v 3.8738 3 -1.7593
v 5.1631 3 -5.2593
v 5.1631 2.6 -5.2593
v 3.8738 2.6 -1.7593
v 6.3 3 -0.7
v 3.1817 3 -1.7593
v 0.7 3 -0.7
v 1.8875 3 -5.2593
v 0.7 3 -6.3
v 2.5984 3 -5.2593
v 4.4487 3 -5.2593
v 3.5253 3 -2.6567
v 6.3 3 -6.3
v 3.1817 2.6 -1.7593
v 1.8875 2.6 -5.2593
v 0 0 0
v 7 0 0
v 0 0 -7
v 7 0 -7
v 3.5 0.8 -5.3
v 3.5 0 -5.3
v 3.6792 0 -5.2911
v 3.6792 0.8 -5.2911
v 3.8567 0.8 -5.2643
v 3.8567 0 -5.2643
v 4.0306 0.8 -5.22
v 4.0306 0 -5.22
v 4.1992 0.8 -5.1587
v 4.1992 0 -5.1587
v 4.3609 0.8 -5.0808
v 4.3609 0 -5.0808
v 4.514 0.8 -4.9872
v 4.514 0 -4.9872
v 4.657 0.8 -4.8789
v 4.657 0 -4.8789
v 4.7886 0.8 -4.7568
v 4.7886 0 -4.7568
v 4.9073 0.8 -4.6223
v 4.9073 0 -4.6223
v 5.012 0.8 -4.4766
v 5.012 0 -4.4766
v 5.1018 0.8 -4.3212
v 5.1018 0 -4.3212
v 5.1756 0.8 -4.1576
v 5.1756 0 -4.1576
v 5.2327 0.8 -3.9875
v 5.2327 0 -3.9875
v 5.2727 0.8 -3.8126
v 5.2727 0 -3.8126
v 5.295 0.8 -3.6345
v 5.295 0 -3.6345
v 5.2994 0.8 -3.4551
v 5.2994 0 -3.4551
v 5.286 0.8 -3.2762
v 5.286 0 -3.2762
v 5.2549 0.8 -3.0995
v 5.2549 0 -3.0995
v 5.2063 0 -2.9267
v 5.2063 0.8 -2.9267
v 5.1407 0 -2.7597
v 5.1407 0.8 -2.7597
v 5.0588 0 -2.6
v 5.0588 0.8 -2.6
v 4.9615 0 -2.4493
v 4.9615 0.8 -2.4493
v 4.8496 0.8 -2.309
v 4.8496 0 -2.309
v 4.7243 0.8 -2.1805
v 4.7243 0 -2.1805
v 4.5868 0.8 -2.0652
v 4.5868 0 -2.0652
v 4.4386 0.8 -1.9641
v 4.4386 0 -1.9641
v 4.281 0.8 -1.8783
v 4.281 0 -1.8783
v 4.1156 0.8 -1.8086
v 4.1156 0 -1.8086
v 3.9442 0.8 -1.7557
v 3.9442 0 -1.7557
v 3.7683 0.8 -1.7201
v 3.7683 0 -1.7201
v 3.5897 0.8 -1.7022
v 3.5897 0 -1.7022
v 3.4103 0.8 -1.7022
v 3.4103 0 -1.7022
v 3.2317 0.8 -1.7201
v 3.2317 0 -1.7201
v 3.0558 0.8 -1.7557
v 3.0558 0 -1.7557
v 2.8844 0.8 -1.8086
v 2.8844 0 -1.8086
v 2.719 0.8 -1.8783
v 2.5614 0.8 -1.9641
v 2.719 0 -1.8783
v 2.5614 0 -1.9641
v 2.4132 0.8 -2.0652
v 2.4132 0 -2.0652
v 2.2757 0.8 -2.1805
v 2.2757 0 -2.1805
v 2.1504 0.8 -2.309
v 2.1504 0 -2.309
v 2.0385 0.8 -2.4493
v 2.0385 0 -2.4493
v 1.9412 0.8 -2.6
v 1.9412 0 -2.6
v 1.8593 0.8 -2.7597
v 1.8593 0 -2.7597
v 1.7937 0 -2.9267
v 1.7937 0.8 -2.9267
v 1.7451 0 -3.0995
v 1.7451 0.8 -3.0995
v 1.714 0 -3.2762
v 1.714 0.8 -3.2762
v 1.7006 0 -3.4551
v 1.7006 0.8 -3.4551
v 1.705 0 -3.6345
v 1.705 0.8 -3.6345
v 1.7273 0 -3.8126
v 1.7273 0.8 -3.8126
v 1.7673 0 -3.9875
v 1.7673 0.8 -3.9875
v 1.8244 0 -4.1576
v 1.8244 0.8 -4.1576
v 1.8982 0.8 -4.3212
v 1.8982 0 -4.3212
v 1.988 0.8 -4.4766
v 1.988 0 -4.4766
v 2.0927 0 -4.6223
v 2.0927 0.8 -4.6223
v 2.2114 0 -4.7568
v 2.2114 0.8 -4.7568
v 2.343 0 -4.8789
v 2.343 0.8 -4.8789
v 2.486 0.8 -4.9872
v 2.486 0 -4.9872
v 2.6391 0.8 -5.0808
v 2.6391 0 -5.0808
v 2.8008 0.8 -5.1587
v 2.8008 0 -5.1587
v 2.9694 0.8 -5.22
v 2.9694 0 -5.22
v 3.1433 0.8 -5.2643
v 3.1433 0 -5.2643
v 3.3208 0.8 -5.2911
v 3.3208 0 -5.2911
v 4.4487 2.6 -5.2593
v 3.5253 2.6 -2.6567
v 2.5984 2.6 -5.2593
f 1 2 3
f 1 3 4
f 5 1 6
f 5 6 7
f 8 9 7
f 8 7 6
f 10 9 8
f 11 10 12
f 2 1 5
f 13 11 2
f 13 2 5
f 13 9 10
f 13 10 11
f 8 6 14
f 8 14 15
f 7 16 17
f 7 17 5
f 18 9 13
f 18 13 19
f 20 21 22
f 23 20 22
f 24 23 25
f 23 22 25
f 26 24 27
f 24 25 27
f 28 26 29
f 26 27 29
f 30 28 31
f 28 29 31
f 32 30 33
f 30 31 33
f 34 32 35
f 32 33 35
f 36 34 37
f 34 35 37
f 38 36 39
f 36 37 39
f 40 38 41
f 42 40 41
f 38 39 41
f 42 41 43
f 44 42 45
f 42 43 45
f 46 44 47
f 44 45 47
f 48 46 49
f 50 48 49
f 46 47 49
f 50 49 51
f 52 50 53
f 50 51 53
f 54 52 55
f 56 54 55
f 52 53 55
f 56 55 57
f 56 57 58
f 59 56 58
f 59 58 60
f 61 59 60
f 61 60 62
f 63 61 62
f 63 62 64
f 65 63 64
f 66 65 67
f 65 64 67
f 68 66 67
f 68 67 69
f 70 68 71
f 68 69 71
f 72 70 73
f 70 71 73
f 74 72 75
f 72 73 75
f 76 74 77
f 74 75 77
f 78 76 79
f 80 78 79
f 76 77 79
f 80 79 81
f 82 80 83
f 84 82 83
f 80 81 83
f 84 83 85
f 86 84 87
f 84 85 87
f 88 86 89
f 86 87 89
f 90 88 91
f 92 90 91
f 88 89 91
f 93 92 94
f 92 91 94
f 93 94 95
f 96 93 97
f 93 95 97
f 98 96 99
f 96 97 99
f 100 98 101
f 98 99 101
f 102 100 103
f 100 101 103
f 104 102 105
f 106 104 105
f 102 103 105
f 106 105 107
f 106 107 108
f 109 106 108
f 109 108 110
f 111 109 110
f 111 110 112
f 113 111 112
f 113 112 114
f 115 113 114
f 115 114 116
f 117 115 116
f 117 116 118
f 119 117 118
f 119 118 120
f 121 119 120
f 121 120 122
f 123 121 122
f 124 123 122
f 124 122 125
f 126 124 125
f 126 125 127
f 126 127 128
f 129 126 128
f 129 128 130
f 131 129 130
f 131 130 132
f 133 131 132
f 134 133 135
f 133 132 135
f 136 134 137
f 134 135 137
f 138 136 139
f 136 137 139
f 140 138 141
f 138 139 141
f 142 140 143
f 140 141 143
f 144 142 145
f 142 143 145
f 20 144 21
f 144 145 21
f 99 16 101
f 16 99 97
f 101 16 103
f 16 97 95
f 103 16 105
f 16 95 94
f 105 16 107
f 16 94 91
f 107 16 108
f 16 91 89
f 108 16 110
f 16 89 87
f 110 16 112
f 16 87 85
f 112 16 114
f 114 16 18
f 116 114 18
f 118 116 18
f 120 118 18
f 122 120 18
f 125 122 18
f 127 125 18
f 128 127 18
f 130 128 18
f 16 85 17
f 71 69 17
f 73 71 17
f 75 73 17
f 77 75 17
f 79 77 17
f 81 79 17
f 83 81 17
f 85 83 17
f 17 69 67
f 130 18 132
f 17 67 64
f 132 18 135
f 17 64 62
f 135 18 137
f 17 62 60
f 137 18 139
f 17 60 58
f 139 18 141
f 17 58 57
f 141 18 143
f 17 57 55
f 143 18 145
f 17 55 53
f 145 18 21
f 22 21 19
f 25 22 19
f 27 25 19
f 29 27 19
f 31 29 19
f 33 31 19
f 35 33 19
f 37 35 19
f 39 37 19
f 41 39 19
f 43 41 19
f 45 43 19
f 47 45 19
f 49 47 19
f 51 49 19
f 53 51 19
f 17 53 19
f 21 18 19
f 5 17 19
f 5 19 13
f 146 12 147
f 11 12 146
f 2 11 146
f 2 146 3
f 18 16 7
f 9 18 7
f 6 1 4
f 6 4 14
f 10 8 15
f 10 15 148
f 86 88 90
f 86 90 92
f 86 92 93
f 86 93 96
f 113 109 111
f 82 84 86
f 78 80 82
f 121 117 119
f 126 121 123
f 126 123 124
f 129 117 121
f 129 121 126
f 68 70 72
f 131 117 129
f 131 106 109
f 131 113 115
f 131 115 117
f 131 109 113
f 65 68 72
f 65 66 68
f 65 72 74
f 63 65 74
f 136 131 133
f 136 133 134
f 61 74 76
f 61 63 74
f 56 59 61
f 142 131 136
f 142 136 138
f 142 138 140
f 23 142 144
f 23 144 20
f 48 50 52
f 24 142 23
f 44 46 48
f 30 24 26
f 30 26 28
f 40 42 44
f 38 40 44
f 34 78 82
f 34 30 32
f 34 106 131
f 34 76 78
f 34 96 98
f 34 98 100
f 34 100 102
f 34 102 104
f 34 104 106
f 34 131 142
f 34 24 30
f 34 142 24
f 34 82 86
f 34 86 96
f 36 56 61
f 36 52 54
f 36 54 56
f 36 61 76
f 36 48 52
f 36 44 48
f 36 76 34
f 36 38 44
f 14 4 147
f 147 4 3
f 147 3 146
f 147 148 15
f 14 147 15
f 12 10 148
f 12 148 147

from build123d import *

# Parameters (mm, degrees)
SKETCH1_W           = 7
SKETCH1_H           = 7
BOSS_EXTRUDE1_DEPTH = 3
CUT_EXTRUDE1_DEPTH  = 7
CUT_EXTRUDE2_DEPTH  = 11
SKETCH4_R           = 1.8
CUT_EXTRUDE3_DEPTH  = 0.8
CUT_EXTRUDE4_DEPTH  = 0.4


with BuildPart() as part:
    # Sketch1 → Boss-Extrude1 (new body)
    with BuildSketch(Plane(origin=(0, 0, 0), x_dir=(1, 0, 0), z_dir=(0, 1, 0))):
        with Locations((3.5, 3.5)):
            Rectangle(SKETCH1_W, SKETCH1_H)
    extrude(amount=BOSS_EXTRUDE1_DEPTH)

    # Sketch2 → Cut-Extrude1 (cut)
    with BuildSketch(Plane.XY):
        Polygon((0, 0), (0.7, 3), (0, 3), align=None)
        Polygon((7, 0), (6.3, 3), (7, 3), align=None)
    extrude(amount=-CUT_EXTRUDE1_DEPTH, mode=Mode.SUBTRACT)

    # Sketch3 → Cut-Extrude2 (cut)
    with BuildSketch(Plane(origin=(0, 0, 0), x_dir=(0, 0, -1), z_dir=(1, 0, 0))):
        Polygon((0, 0), (0.7, 3), (0, 3), align=None)
        Polygon((7, 3), (6.3, 3), (7, 0), align=None)
    extrude(amount=CUT_EXTRUDE2_DEPTH, mode=Mode.SUBTRACT)

    # Sketch4 → Cut-Extrude3 (cut)
    with BuildSketch(Plane.XZ):
        with Locations(Location((3.5, -3.5, 0), (0, 0, 270))):
            Circle(SKETCH4_R)
    extrude(amount=-CUT_EXTRUDE3_DEPTH, mode=Mode.SUBTRACT)

    # Sketch5 → Cut-Extrude4 (cut)
    with BuildSketch(Plane(origin=(0, 3, 0), x_dir=(1, 0, 0), z_dir=(0, 1, 0))):
        Polygon((3.18174557, 1.759282352), (1.887474737, 5.259282352), (2.598412237, 5.259282352), (3.525295249, 2.656718249), (4.448672653, 5.259282352), (5.163115762, 5.259282352), (3.873752781, 1.759282352), align=None)
    extrude(amount=-CUT_EXTRUDE4_DEPTH, mode=Mode.SUBTRACT)


solid = part.part
